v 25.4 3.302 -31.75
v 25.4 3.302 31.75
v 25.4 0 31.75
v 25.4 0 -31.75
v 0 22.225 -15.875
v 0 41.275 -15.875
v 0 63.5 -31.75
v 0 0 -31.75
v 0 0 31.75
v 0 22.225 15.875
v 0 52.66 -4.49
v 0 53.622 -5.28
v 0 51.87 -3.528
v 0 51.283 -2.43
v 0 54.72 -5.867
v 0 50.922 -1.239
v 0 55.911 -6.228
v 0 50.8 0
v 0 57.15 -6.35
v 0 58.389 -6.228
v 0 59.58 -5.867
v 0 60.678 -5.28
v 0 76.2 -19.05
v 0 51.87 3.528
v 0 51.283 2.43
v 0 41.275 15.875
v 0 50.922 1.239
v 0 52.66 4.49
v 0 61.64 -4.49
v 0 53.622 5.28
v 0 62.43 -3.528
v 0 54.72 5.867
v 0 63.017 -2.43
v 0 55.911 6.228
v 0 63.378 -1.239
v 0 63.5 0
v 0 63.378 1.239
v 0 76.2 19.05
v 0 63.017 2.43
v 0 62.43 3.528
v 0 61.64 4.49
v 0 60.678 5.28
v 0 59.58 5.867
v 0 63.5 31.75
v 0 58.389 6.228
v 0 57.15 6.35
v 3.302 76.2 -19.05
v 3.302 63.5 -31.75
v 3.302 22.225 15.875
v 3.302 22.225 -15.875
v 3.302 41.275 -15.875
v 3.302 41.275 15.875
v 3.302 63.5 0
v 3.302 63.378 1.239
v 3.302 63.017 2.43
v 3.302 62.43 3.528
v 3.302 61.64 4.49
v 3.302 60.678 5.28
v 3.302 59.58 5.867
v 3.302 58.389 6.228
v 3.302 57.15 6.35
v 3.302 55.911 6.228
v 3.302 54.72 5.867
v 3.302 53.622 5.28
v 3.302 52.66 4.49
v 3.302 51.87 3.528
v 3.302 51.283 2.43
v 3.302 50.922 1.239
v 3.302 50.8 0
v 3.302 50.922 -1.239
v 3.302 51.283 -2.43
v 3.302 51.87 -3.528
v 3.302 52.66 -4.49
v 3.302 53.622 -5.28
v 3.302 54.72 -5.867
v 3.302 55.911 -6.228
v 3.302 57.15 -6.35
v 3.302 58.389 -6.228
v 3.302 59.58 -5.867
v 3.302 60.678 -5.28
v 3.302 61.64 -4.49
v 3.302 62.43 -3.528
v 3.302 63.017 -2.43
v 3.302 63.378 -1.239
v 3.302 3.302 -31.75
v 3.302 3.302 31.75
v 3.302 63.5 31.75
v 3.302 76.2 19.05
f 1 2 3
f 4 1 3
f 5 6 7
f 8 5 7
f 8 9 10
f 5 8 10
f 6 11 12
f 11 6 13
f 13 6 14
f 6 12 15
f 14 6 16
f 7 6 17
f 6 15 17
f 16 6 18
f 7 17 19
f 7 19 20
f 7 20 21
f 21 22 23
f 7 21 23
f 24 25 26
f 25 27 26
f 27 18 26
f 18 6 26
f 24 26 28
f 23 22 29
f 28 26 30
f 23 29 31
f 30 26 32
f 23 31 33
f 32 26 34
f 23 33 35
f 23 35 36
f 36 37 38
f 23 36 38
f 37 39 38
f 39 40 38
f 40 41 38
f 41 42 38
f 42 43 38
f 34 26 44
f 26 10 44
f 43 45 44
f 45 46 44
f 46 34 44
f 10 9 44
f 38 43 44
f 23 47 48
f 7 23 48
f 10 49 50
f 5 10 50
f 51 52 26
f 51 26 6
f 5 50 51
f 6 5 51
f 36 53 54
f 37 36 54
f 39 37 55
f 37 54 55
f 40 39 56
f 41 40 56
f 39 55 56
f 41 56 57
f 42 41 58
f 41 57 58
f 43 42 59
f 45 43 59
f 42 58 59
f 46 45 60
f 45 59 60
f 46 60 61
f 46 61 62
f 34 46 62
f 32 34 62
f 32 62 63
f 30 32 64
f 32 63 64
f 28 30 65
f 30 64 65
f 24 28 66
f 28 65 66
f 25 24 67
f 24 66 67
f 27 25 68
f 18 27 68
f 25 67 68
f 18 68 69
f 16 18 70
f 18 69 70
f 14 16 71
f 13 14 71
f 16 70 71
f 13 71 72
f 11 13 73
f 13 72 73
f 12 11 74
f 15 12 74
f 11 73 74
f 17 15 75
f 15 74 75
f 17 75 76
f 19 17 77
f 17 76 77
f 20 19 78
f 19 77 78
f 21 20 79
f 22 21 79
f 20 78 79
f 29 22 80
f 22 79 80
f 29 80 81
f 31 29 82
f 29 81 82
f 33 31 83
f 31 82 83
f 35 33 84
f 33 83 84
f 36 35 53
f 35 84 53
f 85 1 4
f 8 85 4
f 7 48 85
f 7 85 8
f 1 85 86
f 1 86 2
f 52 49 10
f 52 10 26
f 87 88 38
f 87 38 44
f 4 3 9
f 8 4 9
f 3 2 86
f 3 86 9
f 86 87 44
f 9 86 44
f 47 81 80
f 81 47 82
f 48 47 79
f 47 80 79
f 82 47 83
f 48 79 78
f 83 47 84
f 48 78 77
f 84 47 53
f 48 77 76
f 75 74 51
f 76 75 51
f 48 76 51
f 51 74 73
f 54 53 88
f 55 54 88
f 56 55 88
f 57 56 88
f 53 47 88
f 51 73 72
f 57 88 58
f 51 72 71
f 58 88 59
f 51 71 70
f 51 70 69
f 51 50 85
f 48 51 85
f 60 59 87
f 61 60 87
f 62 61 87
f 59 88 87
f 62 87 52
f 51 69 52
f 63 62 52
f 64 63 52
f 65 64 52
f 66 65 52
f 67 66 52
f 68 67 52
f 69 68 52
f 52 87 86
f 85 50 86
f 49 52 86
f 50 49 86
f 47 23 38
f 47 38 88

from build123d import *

# Parameters (mm, degrees)
BOSS_EXTRUDE1_DEPTH = 31.75
SKETCH5_R           = 6.35
SKETCH5_W           = 31.75
SKETCH5_H           = 19.05
CUT_EXTRUDE1_DEPTH  = 3.302


with BuildPart() as part:
    # Sketch4 → Boss-Extrude1 (new, symmetric)
    with BuildSketch(Plane.XY):
        Polygon((0, 0), (0, 76.2), (3.302, 76.2), (3.302, 3.302), (25.4, 3.302), (25.4, 0), align=None)
    extrude(amount=BOSS_EXTRUDE1_DEPTH, both=True)

    # Sketch5 → Cut-Extrude1 (cut)
    with BuildSketch(Plane(origin=(3.302, 0, 0), x_dir=(0, 0, -1), z_dir=(1, 0, 0))):
        with Locations(Location((0, 57.15, 0), (0, 0, 90))):
            Circle(SKETCH5_R)
        Polygon((-31.75, 63.5), (-31.75, 76.2), (-19.05, 76.2), align=None)
        with Locations((0, 31.75)):
            Rectangle(SKETCH5_W, SKETCH5_H)
        Polygon((19.05, 76.2), (31.75, 63.5), (31.75, 76.2), align=None)
    extrude(amount=-CUT_EXTRUDE1_DEPTH, mode=Mode.SUBTRACT)


solid = part.part
